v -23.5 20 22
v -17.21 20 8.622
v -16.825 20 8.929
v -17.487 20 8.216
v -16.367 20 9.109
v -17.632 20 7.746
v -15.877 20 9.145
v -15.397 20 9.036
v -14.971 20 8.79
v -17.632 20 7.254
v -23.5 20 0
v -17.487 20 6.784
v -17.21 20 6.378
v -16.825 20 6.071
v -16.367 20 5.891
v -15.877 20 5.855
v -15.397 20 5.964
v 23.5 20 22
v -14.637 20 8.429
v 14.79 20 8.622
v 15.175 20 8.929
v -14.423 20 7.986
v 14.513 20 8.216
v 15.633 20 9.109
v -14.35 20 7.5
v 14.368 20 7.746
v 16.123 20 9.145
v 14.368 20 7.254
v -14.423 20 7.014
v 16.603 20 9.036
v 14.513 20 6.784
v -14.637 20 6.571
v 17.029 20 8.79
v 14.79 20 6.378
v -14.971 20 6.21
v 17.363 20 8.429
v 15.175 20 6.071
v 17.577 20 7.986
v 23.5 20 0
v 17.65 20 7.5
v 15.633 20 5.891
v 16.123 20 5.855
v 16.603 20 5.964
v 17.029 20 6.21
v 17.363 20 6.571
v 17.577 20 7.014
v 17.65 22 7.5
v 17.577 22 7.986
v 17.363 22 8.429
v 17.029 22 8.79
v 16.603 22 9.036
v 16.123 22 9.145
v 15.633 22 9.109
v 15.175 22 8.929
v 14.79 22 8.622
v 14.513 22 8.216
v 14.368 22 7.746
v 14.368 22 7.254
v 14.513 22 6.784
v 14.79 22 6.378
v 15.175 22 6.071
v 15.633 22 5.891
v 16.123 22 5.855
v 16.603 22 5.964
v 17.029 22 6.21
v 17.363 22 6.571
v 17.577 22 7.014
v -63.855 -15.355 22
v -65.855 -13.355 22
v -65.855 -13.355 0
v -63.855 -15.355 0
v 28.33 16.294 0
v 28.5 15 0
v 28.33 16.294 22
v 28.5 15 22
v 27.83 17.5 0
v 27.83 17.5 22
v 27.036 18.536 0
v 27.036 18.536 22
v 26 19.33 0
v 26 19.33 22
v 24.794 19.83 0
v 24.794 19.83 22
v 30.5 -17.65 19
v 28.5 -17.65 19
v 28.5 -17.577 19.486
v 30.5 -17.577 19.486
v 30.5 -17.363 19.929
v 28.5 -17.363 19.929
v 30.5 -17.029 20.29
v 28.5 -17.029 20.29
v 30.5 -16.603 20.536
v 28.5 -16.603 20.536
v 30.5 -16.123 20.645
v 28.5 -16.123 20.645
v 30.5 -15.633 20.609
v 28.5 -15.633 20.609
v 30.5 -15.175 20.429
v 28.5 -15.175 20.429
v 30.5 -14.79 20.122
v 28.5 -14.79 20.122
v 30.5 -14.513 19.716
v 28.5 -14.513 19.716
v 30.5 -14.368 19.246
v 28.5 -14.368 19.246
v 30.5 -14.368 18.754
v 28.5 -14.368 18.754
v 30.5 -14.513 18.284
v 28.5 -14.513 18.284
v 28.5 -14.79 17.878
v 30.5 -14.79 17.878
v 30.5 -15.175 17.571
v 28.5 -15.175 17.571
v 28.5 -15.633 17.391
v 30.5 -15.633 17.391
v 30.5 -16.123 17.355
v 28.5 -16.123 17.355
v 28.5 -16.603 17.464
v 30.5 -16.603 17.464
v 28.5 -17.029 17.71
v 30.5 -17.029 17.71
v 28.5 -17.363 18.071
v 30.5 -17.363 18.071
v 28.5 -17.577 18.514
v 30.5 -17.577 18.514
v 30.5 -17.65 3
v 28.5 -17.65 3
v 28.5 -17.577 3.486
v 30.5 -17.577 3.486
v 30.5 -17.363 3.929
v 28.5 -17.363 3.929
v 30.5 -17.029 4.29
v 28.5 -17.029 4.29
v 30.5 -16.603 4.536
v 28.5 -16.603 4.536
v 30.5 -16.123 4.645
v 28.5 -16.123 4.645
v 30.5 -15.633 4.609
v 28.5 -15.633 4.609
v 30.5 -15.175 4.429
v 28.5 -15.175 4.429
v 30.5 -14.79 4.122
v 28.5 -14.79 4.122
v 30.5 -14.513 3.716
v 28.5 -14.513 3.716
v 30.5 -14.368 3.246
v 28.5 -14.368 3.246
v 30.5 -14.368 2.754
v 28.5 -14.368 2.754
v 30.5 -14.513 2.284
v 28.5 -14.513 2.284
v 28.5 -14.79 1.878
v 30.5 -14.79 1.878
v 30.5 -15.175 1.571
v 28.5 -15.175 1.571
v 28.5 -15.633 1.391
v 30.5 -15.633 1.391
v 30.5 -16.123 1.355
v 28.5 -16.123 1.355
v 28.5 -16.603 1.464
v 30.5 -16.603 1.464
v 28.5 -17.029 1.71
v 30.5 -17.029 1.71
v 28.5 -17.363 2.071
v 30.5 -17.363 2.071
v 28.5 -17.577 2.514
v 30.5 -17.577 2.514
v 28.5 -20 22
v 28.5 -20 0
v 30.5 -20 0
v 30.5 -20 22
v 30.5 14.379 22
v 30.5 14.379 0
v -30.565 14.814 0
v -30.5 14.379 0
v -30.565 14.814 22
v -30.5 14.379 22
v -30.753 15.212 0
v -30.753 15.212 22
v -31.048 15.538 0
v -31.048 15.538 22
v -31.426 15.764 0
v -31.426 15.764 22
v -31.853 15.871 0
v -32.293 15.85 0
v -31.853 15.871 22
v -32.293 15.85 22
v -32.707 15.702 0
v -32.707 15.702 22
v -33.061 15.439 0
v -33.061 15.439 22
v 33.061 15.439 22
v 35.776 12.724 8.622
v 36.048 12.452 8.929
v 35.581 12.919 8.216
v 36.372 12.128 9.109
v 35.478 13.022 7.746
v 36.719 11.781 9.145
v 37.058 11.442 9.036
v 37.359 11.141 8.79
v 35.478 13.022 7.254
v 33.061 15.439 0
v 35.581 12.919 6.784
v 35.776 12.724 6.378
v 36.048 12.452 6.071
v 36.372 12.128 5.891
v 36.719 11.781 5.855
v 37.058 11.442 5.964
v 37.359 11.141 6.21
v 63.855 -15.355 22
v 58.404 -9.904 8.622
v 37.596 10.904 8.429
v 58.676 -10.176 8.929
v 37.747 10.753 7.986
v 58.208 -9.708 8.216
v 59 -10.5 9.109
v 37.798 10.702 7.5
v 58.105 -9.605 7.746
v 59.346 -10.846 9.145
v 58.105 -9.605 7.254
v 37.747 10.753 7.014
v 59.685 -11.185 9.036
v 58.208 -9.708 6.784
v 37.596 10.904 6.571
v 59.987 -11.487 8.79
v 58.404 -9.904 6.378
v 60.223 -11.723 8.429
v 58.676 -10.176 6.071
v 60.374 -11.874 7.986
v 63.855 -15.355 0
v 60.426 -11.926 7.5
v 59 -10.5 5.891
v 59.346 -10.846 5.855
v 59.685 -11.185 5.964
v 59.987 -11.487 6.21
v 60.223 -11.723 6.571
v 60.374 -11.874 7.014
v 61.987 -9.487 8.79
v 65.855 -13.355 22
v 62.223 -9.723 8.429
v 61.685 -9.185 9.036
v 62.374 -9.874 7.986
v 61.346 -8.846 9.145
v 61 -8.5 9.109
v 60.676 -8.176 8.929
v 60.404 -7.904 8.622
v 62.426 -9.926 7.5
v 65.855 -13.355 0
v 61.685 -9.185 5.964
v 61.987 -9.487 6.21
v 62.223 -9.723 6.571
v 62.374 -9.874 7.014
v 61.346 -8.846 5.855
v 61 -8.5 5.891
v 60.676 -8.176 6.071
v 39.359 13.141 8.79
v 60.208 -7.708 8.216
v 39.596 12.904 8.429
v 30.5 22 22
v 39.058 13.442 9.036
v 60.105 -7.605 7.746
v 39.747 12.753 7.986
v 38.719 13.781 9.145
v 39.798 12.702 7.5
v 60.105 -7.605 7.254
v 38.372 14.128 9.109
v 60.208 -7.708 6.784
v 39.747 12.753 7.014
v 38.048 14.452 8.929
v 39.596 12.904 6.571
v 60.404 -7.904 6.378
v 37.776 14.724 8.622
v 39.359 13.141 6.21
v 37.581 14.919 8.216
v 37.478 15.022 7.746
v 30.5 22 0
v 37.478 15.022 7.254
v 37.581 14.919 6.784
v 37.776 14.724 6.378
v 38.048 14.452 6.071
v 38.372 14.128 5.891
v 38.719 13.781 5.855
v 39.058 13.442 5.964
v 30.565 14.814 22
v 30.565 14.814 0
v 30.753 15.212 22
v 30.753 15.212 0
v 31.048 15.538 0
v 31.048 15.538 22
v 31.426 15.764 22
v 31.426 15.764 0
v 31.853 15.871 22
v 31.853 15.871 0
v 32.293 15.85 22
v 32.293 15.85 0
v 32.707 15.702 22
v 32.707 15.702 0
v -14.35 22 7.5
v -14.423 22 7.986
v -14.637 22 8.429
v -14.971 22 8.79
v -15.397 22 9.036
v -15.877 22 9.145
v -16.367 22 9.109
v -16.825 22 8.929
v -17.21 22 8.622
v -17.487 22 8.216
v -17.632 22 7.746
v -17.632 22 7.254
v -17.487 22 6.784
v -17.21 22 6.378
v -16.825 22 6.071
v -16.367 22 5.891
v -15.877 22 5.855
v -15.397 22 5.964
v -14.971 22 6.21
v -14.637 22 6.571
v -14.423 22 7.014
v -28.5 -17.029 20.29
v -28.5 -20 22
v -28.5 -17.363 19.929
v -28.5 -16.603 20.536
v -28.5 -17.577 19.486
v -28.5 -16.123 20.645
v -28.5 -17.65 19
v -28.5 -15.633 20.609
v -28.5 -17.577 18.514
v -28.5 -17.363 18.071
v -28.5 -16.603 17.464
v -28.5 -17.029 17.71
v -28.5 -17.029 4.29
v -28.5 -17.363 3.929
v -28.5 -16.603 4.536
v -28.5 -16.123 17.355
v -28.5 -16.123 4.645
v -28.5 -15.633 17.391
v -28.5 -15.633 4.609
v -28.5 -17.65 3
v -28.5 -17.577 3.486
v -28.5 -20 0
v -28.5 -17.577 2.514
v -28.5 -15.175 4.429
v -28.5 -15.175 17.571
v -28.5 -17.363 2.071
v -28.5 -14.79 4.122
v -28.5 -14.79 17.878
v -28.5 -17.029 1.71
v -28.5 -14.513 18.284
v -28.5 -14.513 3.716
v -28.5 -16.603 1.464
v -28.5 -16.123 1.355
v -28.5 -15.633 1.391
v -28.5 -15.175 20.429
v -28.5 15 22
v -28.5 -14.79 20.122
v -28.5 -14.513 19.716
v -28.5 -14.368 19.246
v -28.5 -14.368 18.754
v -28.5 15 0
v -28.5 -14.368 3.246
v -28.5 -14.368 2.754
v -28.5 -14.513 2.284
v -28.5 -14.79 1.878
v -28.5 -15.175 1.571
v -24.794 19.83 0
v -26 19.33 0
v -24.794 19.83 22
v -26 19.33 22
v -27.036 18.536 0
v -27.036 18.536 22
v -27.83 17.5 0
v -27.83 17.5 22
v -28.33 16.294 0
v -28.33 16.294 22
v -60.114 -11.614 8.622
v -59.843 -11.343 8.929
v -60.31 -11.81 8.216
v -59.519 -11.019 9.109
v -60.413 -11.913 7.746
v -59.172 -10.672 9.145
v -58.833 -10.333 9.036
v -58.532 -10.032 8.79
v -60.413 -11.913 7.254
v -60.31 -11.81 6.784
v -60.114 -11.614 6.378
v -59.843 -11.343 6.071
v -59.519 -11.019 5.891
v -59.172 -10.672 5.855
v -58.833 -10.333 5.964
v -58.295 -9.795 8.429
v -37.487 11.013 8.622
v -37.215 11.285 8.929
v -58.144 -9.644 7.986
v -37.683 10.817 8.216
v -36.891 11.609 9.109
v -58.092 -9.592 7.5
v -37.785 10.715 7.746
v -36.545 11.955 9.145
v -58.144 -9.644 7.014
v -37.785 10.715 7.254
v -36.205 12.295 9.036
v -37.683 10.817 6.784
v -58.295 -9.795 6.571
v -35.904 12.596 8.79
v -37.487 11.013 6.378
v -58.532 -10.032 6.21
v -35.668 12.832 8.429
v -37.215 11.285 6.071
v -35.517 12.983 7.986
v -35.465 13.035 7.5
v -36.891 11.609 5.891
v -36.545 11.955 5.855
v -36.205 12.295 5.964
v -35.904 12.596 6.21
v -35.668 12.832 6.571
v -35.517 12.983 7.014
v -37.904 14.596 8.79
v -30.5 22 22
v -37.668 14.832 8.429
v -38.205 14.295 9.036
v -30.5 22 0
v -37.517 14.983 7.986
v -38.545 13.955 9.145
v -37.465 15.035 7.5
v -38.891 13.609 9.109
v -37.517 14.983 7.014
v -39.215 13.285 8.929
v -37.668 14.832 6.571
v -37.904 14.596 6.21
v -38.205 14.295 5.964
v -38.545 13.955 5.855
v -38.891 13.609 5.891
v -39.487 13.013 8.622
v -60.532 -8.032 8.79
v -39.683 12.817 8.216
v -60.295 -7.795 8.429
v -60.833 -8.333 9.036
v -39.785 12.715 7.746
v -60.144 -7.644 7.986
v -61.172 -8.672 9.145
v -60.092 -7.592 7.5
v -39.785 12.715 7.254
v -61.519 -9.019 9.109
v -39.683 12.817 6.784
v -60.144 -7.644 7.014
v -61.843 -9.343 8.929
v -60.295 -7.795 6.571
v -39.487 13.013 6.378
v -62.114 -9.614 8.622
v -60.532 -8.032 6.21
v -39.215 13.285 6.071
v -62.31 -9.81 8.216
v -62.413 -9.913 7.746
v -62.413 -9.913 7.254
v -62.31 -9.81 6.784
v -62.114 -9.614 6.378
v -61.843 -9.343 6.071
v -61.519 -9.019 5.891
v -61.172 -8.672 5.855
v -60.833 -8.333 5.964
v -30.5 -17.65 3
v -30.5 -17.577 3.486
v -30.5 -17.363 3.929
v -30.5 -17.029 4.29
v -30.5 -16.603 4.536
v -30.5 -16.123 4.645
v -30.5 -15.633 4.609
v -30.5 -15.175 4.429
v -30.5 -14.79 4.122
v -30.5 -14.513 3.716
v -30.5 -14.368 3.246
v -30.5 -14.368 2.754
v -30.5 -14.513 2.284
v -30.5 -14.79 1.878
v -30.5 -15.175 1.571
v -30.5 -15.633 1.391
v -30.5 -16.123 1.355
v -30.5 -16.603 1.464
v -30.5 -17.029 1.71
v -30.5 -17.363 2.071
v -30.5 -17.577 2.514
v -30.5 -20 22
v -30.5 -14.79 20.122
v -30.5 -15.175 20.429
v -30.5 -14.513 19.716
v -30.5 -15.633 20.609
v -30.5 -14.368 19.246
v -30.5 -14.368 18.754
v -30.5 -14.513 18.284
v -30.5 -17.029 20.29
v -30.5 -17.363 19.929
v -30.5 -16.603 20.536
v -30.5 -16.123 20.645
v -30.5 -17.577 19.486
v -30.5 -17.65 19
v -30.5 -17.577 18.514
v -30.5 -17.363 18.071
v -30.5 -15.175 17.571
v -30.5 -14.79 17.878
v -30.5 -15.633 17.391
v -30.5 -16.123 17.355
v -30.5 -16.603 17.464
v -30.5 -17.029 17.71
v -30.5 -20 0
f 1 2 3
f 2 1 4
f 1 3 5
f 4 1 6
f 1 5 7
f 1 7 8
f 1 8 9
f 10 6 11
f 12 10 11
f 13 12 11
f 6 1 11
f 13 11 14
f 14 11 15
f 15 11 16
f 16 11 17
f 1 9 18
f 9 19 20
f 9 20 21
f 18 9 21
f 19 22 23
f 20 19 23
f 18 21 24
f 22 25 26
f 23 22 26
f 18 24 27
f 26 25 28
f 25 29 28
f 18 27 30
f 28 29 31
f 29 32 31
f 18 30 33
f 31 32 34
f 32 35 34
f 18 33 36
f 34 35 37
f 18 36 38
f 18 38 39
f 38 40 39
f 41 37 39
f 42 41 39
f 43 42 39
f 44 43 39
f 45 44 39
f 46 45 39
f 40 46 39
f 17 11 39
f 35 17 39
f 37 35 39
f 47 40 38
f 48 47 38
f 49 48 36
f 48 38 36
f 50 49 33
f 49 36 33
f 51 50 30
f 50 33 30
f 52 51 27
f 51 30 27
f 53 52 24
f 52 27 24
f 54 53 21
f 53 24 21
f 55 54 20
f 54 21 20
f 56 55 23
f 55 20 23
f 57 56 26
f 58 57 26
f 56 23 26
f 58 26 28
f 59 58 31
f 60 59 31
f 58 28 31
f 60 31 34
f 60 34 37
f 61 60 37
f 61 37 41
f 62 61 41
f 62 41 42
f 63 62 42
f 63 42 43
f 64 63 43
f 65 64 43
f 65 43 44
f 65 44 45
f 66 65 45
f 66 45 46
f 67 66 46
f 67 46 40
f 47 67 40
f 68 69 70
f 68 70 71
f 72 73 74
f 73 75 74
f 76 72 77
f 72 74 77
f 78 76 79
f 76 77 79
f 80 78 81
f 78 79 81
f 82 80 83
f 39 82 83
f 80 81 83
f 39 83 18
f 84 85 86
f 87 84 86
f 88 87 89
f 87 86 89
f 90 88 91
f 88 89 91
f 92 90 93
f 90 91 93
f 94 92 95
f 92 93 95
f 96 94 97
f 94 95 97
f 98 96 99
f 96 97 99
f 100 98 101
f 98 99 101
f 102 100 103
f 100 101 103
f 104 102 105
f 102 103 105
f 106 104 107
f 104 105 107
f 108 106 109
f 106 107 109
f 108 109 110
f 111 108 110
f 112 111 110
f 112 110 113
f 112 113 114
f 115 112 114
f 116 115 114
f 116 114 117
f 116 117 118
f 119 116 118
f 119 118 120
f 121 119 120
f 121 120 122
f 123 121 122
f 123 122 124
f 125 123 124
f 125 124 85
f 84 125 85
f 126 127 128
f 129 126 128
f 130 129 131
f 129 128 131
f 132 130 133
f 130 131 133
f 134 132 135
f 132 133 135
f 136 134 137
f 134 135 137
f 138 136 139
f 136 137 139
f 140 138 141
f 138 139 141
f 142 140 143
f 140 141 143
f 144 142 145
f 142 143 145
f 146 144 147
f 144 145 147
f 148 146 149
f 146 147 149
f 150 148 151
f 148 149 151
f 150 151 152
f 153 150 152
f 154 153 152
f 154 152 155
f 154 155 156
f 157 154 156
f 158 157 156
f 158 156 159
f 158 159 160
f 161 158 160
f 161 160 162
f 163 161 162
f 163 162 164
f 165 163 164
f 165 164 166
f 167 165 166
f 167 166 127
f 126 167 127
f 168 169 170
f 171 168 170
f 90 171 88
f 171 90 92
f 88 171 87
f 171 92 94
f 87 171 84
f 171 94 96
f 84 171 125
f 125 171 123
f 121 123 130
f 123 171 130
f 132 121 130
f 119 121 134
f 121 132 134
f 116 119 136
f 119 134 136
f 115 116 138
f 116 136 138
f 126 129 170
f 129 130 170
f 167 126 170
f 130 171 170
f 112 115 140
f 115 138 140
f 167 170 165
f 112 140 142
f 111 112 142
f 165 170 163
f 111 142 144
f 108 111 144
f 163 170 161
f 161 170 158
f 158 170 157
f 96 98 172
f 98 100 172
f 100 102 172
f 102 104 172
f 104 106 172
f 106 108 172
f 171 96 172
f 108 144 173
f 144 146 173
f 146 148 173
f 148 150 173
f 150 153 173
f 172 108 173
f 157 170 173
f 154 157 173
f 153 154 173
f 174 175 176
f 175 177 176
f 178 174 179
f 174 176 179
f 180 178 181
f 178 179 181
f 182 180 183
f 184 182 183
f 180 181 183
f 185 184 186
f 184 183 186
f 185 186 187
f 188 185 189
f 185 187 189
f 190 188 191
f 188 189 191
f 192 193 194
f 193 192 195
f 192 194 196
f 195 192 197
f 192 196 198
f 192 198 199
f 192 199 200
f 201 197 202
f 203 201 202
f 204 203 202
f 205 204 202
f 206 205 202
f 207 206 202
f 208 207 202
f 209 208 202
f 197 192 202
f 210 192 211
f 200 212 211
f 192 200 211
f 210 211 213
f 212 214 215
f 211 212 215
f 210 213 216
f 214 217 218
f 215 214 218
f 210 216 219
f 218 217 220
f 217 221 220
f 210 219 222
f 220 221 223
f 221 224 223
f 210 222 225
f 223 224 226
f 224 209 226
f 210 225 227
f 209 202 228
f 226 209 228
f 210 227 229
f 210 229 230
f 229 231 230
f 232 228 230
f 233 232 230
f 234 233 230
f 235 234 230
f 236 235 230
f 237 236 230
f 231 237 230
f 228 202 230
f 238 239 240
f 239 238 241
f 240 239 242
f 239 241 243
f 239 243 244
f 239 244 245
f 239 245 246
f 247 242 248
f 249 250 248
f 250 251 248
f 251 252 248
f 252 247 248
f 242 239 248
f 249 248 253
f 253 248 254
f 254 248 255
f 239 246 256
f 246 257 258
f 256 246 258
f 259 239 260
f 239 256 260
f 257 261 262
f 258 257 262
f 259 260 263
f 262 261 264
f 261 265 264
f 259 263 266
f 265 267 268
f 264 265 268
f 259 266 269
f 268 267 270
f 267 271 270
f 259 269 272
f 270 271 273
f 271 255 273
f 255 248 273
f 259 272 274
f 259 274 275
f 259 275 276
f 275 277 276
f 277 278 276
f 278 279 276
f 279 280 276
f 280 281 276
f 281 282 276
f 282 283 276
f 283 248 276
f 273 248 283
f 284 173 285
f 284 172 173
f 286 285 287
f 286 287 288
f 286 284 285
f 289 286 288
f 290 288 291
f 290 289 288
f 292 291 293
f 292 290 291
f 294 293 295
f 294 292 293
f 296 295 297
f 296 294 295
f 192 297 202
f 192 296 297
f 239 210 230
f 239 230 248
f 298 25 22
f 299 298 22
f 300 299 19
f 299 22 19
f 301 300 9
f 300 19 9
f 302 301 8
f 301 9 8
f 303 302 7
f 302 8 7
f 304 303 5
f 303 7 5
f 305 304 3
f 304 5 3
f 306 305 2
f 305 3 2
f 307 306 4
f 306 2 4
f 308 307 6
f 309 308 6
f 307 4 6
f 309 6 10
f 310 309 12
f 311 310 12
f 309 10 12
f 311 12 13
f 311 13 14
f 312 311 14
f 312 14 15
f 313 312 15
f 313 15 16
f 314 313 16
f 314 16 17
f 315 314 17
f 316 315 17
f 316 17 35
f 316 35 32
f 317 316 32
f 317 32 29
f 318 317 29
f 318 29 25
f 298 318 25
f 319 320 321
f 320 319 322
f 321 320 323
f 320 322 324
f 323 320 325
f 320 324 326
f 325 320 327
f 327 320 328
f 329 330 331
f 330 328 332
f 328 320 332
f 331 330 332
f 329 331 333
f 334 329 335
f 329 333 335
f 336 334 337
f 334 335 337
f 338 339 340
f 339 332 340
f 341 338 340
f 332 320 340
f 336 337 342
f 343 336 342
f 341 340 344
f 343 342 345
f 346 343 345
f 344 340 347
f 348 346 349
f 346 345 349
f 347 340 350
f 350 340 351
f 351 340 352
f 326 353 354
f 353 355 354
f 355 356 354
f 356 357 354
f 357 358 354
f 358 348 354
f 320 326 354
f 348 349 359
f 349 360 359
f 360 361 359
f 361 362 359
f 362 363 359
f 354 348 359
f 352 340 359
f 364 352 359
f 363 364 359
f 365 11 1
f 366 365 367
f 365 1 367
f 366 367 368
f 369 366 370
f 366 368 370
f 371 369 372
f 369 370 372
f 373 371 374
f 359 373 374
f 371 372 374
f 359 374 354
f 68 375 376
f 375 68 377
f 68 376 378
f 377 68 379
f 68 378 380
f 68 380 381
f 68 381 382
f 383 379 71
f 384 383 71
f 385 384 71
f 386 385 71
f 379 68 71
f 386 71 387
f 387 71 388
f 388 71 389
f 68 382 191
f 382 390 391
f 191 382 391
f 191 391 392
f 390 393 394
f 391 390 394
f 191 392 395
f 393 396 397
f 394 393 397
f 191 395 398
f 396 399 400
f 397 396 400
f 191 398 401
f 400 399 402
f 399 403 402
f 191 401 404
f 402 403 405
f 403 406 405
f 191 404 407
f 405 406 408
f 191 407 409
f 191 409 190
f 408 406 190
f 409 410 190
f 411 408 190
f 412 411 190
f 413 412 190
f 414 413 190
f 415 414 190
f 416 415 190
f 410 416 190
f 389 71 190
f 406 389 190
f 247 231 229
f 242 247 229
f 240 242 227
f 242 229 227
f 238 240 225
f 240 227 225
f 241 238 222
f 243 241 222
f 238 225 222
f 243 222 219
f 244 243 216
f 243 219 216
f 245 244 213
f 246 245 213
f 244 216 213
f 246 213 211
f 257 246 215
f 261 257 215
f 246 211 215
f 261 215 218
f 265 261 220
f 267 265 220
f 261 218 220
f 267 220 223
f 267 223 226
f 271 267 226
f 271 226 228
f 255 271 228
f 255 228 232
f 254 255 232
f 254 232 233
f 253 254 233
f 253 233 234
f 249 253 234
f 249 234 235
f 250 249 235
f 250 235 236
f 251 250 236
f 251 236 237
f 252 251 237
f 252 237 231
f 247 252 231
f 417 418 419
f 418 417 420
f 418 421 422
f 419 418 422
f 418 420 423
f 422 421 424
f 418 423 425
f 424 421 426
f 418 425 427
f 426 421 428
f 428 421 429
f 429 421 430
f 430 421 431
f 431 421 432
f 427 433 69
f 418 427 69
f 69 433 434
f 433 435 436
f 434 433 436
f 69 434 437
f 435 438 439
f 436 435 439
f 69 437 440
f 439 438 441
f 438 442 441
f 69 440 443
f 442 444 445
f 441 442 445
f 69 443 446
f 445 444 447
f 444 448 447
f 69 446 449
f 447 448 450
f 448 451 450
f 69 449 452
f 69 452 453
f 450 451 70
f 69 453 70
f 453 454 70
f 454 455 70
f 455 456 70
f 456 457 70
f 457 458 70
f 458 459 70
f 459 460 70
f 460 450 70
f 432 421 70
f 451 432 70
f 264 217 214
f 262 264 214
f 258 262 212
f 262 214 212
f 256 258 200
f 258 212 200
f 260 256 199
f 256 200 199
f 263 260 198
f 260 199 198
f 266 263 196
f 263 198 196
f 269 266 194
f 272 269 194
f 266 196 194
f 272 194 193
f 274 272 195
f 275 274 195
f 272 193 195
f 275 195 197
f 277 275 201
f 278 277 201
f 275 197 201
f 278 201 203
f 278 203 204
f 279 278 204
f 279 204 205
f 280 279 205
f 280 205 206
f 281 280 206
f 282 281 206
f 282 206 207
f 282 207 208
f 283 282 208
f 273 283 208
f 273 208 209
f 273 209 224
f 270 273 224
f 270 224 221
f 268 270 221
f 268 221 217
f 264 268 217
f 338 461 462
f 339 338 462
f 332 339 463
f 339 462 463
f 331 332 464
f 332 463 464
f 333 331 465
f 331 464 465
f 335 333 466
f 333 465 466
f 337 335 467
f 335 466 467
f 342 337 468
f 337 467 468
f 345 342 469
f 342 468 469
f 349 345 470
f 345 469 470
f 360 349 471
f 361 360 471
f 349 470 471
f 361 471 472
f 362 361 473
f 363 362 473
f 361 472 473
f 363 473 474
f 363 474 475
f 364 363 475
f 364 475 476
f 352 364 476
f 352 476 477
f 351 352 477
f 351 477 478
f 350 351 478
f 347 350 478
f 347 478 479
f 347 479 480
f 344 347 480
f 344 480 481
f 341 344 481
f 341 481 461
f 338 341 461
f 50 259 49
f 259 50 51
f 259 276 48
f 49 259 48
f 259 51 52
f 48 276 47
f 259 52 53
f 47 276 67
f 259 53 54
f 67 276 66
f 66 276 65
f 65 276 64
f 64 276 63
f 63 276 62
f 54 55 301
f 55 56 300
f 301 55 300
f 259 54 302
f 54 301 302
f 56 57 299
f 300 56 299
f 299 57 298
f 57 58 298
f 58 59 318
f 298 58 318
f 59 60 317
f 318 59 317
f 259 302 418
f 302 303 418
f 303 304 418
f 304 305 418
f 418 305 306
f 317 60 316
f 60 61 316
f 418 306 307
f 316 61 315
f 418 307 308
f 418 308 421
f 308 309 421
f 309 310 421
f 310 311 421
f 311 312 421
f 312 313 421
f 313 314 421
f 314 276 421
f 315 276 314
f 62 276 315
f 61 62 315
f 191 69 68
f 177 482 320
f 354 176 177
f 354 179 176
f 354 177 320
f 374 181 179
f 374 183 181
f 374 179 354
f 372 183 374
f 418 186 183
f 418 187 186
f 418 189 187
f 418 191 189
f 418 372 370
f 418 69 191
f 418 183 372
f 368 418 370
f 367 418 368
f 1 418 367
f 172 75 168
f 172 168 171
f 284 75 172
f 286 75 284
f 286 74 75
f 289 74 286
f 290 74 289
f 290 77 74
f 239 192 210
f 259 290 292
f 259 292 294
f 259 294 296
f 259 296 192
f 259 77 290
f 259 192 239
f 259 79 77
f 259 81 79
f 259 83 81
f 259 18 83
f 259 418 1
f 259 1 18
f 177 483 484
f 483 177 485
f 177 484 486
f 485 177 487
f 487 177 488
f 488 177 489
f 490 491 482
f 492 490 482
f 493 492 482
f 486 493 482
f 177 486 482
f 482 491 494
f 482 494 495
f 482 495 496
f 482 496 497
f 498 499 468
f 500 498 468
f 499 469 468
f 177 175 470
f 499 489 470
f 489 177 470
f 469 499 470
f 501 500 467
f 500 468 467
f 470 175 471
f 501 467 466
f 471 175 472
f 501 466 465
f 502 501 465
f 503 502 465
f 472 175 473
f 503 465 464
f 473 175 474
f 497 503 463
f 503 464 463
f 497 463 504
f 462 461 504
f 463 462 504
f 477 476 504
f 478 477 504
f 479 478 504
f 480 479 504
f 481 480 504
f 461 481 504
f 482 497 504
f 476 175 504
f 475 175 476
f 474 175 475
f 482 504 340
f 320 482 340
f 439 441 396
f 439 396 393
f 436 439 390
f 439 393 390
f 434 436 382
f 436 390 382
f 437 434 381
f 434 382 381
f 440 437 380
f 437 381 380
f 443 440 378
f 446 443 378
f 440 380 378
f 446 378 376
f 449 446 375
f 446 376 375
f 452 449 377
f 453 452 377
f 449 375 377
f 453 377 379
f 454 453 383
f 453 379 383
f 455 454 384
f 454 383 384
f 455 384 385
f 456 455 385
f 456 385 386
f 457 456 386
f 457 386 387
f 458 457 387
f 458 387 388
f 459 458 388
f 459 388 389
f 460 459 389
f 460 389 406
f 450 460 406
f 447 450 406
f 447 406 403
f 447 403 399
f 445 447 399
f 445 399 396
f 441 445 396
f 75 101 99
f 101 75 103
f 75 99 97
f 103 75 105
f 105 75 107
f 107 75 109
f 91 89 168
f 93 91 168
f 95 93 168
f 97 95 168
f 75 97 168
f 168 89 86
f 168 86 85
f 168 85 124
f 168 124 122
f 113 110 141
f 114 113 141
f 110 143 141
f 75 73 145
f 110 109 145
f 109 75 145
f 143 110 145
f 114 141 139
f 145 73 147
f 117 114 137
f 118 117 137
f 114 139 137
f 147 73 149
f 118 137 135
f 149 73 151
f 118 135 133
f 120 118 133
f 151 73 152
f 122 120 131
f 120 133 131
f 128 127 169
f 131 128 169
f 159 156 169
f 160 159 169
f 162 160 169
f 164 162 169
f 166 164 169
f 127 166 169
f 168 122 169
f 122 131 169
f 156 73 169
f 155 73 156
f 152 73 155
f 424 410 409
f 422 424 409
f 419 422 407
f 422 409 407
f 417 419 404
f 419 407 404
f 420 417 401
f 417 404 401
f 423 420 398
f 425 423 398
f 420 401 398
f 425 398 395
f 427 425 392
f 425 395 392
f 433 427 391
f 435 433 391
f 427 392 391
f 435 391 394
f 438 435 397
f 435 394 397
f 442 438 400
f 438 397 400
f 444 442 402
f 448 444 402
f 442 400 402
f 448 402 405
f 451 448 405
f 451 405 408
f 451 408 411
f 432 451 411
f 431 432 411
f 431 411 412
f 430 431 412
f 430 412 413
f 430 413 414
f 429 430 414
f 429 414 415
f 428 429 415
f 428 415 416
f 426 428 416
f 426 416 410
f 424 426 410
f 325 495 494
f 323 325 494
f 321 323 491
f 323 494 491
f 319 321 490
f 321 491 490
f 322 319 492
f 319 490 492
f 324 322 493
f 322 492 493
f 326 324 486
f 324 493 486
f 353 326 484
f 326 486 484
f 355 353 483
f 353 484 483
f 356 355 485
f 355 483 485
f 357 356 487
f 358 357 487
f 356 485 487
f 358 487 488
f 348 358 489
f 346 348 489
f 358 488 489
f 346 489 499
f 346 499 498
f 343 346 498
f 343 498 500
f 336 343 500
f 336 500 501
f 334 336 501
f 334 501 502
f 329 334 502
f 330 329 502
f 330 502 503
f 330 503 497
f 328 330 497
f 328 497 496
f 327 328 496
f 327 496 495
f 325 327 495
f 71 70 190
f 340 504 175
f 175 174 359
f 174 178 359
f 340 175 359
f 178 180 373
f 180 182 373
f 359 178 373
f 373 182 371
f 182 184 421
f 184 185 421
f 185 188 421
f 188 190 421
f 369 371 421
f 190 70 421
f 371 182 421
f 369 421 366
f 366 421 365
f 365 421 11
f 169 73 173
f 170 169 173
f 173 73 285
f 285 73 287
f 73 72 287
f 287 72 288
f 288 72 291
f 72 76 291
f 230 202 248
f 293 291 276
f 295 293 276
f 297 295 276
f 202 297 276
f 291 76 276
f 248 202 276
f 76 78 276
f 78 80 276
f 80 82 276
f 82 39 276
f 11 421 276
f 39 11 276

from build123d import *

# Parameters (mm, degrees)
F1_DEPTH  = 22
F3_D      = 3.3
F3_DEPTH  = 3
F3_TIP    = 0.9914200214
F4_R      = 1.5
F5_R      = 5
F7_D      = 3.3
F7_DEPTH  = 3
F7_TIP    = 0.9914200214
F9_D      = 3.3
F9_DEPTH  = 3
F9_TIP    = 0.9914200214
F11_D     = 3.3
F11_DEPTH = 63
F11_TIP   = 0.9914200214


with BuildPart() as f1:
    # F0 (on Top) → F1 (new body)
    with BuildSketch(Plane.XY):
        Polygon((-28.5, -20), (-28.5, 20), (28.5, 20), (28.5, -20), (30.5, -20), (30.5, 18), (63.8553390593, -15.3553390593), (65.8553390593, -13.3553390593), (30.5, 22), (-30.5, 22), (-65.8553390593, -13.3553390593), (-63.8553390593, -15.3553390593), (-30.5, 18), (-30.5, -20), align=None)
    extrude(amount=F1_DEPTH)

    # F3
    with Locations(Plane(origin=(26.25, 26.25, 0), x_dir=(-0.7071067812, 0.7071067812, 0), z_dir=(0.7071067812, 0.7071067812, 0))):
        with Locations((-17.5104076401, 7.5), (-49.5104076401, 7.5)):
            Hole(F3_D / 2, depth=F3_DEPTH)
            with Locations((0, 0, -(F3_DEPTH + F3_TIP / 2))):  # 118° drill point
                Cone(0, F3_D / 2, F3_TIP, mode=Mode.SUBTRACT)

    # F4
    f4_edges = [f1.edges().sort_by_distance(p)[0] for p in [
        (-30.5, 18, 11),
        (30.5, 18, 11),
    ]]
    fillet(f4_edges, radius=F4_R)

    # F5
    f5_edges = [f1.edges().sort_by_distance(p)[0] for p in [
        (-28.5, 20, 11),
        (28.5, 20, 11),
    ]]
    fillet(f5_edges, radius=F5_R)

    # F7
    with Locations(Plane(origin=(-26.25, 26.25, 0), x_dir=(-0.7071067812, -0.7071067812, 0), z_dir=(-0.7071067812, 0.7071067812, 0))):
        with Locations((17.5104076401, 7.5), (49.5104076401, 7.5)):
            Hole(F7_D / 2, depth=F7_DEPTH)
            with Locations((0, 0, -(F7_DEPTH + F7_TIP / 2))):  # 118° drill point
                Cone(0, F7_D / 2, F7_TIP, mode=Mode.SUBTRACT)

    # F9
    with Locations(Plane(origin=(0, 22, 0), x_dir=(-1, 0, 0), z_dir=(0, 1, 0))):
        with Locations((-16, 7.5), (16, 7.5)):
            Hole(F9_D / 2, depth=F9_DEPTH)
            with Locations((0, 0, -(F9_DEPTH + F9_TIP / 2))):  # 118° drill point
                Cone(0, F9_D / 2, F9_TIP, mode=Mode.SUBTRACT)

    # F11 (one way)
    with BuildSketch(Plane(origin=(-30.5, 0, 0), x_dir=(0, -1, 0), z_dir=(-1, 0, 0))):
        with Locations((16, 19), (16, 3)):
            Circle(F11_D / 2)
    extrude(amount=-F11_DEPTH, mode=Mode.SUBTRACT)
    with Locations(Plane(origin=(-30.5, 0, 0), x_dir=(0, -1, 0), z_dir=(-1, 0, 0))):
        with Locations((16, 19), (16, 3)):
            with Locations((0, 0, -(F11_DEPTH + F11_TIP / 2))):  # 118° drill point
                Cone(0, F11_D / 2, F11_TIP, mode=Mode.SUBTRACT)


solid = f1.part
